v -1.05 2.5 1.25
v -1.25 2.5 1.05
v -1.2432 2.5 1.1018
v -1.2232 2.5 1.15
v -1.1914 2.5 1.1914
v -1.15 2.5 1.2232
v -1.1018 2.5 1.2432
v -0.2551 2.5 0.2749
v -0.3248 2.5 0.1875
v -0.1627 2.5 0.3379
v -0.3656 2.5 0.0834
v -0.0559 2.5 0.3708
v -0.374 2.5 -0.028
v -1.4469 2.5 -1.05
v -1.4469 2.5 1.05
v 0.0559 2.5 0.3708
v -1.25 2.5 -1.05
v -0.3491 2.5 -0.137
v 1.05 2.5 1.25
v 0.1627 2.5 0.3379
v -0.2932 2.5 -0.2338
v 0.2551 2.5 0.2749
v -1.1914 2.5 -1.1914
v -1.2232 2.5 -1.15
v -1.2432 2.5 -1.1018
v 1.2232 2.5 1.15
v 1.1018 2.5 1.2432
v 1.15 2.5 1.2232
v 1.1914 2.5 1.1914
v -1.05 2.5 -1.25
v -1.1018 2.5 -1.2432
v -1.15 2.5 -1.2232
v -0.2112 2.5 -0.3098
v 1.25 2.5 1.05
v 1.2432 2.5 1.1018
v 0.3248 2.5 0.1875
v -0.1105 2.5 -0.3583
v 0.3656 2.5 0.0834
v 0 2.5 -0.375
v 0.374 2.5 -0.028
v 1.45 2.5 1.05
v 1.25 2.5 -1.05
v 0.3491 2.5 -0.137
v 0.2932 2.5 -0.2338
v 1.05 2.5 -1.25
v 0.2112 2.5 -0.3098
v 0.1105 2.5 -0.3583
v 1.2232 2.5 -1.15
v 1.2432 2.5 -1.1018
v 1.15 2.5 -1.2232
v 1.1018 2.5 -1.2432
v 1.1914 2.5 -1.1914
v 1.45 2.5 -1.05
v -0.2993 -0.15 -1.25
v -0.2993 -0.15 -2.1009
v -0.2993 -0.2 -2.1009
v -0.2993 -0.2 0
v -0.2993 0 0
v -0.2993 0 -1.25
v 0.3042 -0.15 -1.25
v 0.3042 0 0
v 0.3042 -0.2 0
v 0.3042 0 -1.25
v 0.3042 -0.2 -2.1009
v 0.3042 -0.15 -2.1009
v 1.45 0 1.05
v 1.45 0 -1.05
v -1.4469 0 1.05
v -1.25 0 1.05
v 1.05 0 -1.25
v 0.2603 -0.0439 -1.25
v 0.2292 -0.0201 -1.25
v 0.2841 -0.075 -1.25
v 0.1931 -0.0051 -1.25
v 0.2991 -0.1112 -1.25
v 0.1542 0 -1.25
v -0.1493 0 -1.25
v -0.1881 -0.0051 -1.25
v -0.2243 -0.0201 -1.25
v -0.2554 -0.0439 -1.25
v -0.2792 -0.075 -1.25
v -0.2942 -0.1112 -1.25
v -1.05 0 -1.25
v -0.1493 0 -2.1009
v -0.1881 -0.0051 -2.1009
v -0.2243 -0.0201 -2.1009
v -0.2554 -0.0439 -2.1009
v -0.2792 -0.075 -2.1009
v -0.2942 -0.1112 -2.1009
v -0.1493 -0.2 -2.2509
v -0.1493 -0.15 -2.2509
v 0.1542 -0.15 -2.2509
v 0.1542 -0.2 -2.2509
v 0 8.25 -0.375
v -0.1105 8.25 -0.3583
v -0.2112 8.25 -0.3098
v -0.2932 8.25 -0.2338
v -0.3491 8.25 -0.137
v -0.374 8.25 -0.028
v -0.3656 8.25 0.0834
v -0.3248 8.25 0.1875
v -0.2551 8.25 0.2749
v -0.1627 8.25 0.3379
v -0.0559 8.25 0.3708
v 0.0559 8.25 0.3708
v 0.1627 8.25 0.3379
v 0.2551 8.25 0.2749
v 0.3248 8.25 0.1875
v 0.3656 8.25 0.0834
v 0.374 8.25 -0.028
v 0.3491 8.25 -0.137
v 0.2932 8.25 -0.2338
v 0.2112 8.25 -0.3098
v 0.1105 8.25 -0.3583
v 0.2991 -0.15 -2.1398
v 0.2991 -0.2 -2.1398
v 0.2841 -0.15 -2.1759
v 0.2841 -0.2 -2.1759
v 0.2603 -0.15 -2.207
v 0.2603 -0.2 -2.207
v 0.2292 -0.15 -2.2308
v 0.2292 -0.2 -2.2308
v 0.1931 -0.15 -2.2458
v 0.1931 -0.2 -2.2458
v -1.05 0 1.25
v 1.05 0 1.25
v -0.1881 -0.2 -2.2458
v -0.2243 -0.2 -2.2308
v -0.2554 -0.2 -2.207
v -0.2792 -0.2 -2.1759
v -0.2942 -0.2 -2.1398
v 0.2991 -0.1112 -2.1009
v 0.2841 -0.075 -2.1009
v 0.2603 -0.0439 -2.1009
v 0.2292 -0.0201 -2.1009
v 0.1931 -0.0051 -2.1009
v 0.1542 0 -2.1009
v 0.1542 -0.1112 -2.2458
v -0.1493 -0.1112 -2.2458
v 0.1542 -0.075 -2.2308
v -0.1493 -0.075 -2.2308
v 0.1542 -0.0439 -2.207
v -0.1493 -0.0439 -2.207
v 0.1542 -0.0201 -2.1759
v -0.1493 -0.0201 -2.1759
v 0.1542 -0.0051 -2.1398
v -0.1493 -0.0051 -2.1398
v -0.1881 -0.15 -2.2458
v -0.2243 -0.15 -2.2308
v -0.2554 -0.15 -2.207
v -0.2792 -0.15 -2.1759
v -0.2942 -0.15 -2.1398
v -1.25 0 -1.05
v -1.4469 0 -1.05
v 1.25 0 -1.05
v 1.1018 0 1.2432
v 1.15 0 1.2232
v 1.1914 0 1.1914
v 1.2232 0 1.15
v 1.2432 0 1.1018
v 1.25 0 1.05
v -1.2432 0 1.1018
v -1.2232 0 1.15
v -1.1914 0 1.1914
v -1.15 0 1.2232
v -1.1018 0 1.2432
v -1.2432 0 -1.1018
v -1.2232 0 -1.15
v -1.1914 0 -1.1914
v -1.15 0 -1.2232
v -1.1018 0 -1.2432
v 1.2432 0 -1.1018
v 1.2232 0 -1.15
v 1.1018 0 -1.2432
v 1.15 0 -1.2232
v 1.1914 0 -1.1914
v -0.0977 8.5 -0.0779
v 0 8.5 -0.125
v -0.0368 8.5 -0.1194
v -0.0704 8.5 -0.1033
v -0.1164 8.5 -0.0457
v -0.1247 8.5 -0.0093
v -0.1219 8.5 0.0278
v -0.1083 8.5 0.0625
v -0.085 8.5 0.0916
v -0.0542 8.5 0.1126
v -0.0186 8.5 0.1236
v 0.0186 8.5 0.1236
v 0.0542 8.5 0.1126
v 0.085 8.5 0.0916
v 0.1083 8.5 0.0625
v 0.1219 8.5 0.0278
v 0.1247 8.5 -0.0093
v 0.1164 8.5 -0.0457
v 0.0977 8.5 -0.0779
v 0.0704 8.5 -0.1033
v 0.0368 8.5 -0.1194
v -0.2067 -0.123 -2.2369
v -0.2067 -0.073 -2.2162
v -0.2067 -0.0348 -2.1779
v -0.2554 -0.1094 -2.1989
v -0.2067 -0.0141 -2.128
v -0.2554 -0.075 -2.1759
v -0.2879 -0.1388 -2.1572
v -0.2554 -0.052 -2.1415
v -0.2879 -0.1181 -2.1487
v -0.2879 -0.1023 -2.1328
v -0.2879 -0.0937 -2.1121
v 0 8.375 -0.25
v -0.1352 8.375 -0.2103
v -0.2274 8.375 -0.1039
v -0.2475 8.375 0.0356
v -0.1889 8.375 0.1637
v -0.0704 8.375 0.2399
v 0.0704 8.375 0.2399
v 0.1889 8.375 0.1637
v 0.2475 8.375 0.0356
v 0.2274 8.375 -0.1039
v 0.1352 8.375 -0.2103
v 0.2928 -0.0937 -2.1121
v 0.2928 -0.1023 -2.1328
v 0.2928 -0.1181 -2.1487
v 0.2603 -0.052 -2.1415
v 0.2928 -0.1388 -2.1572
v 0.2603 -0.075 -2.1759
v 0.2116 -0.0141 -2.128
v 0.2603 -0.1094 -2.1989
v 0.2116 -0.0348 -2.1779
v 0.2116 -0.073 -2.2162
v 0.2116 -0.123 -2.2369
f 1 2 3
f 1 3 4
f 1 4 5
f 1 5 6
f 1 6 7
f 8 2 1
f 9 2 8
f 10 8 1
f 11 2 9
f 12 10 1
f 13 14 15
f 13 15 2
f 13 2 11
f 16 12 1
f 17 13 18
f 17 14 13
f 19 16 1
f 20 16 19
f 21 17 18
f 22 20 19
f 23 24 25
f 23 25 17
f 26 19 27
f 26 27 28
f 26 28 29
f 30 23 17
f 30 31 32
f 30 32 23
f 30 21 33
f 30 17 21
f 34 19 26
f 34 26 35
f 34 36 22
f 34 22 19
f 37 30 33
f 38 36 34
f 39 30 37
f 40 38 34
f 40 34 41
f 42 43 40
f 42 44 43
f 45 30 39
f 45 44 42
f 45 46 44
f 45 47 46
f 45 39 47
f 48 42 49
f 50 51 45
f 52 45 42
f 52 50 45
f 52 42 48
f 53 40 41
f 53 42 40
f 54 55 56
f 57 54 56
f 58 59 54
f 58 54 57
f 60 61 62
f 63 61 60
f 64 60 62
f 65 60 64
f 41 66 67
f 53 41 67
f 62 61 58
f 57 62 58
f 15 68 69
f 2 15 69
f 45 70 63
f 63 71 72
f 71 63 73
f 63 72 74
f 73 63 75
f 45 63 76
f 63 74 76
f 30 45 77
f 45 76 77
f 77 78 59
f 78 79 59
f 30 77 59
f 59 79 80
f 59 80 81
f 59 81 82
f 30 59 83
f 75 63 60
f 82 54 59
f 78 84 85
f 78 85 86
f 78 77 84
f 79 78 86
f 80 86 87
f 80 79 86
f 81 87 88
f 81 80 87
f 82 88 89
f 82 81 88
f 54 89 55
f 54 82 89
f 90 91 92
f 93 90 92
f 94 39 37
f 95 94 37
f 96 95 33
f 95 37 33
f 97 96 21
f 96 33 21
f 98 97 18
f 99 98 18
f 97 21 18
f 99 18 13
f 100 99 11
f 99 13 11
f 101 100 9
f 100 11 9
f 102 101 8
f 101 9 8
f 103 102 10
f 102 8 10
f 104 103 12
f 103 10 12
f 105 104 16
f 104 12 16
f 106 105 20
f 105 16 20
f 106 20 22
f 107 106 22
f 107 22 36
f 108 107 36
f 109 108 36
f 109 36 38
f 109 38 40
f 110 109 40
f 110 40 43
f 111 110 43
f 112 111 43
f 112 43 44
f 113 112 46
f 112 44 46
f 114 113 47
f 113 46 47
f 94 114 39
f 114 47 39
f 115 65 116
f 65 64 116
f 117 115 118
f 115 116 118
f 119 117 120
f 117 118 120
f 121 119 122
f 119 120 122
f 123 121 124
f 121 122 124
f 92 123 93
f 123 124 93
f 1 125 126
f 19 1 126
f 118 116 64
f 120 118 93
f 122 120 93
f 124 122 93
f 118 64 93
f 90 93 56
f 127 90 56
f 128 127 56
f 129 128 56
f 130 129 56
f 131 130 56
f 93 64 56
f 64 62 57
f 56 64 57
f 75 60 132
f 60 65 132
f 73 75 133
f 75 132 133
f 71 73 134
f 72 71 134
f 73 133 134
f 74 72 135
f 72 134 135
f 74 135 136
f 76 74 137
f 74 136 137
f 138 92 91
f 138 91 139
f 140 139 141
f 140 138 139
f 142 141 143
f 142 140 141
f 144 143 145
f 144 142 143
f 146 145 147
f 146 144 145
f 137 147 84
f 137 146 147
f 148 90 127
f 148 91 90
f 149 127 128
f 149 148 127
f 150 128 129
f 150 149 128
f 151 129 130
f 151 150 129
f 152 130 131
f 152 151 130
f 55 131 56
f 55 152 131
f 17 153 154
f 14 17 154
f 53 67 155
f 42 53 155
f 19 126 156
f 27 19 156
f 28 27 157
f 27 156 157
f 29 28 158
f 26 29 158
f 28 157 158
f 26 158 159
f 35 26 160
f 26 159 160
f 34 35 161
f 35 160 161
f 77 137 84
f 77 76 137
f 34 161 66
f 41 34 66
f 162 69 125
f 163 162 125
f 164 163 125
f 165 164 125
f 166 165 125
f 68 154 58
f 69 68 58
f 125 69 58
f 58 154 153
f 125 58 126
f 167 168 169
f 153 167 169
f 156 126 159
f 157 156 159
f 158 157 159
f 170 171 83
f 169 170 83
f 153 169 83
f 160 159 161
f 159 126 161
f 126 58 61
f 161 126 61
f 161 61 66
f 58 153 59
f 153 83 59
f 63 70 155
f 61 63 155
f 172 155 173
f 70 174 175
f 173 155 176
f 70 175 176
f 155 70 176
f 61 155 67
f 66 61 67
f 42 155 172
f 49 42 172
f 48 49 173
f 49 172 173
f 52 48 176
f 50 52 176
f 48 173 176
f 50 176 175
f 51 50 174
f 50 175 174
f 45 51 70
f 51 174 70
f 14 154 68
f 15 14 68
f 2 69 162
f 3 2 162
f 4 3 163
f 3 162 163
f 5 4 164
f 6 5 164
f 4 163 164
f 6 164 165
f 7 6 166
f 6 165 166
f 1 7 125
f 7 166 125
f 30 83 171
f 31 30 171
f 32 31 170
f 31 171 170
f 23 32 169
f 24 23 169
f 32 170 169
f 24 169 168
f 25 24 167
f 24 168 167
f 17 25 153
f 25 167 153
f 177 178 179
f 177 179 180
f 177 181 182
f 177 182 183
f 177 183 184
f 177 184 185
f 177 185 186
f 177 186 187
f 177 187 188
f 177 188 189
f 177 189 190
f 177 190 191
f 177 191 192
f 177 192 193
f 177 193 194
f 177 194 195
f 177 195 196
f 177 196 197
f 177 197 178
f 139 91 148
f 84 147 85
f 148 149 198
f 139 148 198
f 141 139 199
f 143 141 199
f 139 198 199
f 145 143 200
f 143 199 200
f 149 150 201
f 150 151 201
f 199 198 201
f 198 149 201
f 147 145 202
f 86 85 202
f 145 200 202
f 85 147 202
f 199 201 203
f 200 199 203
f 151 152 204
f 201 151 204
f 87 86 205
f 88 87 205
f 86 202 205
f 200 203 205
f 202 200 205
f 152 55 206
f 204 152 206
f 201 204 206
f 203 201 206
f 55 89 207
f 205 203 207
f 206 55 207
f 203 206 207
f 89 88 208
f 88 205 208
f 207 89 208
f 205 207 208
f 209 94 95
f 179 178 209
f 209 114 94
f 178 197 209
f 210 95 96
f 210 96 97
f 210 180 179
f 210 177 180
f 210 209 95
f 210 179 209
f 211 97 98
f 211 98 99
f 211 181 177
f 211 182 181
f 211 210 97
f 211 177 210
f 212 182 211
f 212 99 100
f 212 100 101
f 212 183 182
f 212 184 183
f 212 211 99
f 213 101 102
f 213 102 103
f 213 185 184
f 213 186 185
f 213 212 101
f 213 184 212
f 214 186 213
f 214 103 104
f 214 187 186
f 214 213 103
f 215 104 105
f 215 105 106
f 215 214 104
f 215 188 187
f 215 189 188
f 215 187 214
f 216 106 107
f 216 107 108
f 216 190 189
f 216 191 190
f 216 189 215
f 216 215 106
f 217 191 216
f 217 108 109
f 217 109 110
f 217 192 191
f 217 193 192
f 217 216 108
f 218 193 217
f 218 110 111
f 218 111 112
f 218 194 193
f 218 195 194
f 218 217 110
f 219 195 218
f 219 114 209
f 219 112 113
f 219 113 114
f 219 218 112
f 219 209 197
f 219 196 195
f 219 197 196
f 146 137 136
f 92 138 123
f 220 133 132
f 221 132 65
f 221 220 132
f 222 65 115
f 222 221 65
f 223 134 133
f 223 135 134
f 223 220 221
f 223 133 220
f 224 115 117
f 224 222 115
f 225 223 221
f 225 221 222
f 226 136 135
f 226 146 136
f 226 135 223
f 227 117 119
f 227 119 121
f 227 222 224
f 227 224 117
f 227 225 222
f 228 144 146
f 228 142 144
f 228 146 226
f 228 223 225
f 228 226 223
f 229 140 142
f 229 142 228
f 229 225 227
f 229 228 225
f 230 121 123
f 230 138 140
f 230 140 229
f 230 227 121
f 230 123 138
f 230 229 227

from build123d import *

# Parameters (mm, degrees)
BOSS_EXTRU_1_DEPTH = 2.5
ESQUISSE3_R        = 0.375
BOSS_EXTRU_2_DEPTH = 6
CHANFREIN1_SIZE    = 0.25
BOSS_EXTRU_3_DEPTH = 0.2
CONG_1_R           = 0.15
CONG_2_R           = 0.15


with BuildPart() as part:
    # Esquisse1 → Boss.-Extru.1 (new body)
    with BuildSketch(Plane(origin=(0, 0, 0), x_dir=(1, 0, 0), z_dir=(0, 1, 0))):
        with BuildLine():
            Line((-1.25, 1.05), (-1.446931313, 1.05))
            Line((-1.446931313, 1.05), (-1.446931313, -1.05))
            Line((-1.446931313, -1.05), (-1.25, -1.05))
            ThreePointArc((-1.25, -1.05), (-1.191421356, -1.191421356), (-1.05, -1.25))
            Line((-1.05, -1.25), (1.05, -1.25))
            ThreePointArc((1.05, -1.25), (1.191421356, -1.191421356), (1.25, -1.05))
            Line((1.25, -1.05), (1.449962609, -1.05))
            Line((1.449962609, -1.05), (1.449962609, 1.05))
            Line((1.449962609, 1.05), (1.25, 1.05))
            ThreePointArc((1.25, 1.05), (1.191421356, 1.191421356), (1.05, 1.25))
            Line((1.05, 1.25), (-1.05, 1.25))
            ThreePointArc((-1.05, 1.25), (-1.191421356, 1.191421356), (-1.25, 1.05))
        make_face()
    extrude(amount=BOSS_EXTRU_1_DEPTH)

    # Esquisse3 → Boss.-Extru.2 (add)
    with BuildSketch(Plane(origin=(0, 2.5, 0), x_dir=(1, 0, 0), z_dir=(0, 1, 0))):
        with Locations(Location((0, 0, 0), (0, 0, 90))):
            Circle(ESQUISSE3_R)
    extrude(amount=BOSS_EXTRU_2_DEPTH)

    # Chanfrein1
    chanfrein1_edges = [part.edges().sort_by_distance(p)[0] for p in [
        (0, 8.5, 0.375),
    ]]
    chamfer(chanfrein1_edges, length=CHANFREIN1_SIZE)

    # Esquisse4 → Boss.-Extru.3 (add)
    with BuildSketch(Plane.XZ):
        Polygon((0, 0), (0.304241832, 0), (0.304241832, -2.250938438), (0, -2.250938438), (-0.299312937, -2.250938438), (-0.299312937, 0), align=None)
    extrude(amount=BOSS_EXTRU_3_DEPTH)

    # Congé1
    cong_1_edges = [part.edges().sort_by_distance(p)[0] for p in [
        (0.002464447, 0, -2.250938438),
    ]]
    fillet(cong_1_edges, radius=CONG_1_R)

    # Congé2
    cong_2_edges = [part.edges().sort_by_distance(p)[0] for p in [
        (-0.299312937, 0, -1.675469219),
        (-0.299312937, -0.175, -2.250938438),
        (0.304241832, -0.175, -2.250938438),
        (0.304241832, 0, -1.675469219),
        (0.304241832, -0.043933983, -2.207004455),
        (-0.299312937, -0.043933983, -2.207004455),
    ]]
    fillet(cong_2_edges, radius=CONG_2_R)


solid = part.part
